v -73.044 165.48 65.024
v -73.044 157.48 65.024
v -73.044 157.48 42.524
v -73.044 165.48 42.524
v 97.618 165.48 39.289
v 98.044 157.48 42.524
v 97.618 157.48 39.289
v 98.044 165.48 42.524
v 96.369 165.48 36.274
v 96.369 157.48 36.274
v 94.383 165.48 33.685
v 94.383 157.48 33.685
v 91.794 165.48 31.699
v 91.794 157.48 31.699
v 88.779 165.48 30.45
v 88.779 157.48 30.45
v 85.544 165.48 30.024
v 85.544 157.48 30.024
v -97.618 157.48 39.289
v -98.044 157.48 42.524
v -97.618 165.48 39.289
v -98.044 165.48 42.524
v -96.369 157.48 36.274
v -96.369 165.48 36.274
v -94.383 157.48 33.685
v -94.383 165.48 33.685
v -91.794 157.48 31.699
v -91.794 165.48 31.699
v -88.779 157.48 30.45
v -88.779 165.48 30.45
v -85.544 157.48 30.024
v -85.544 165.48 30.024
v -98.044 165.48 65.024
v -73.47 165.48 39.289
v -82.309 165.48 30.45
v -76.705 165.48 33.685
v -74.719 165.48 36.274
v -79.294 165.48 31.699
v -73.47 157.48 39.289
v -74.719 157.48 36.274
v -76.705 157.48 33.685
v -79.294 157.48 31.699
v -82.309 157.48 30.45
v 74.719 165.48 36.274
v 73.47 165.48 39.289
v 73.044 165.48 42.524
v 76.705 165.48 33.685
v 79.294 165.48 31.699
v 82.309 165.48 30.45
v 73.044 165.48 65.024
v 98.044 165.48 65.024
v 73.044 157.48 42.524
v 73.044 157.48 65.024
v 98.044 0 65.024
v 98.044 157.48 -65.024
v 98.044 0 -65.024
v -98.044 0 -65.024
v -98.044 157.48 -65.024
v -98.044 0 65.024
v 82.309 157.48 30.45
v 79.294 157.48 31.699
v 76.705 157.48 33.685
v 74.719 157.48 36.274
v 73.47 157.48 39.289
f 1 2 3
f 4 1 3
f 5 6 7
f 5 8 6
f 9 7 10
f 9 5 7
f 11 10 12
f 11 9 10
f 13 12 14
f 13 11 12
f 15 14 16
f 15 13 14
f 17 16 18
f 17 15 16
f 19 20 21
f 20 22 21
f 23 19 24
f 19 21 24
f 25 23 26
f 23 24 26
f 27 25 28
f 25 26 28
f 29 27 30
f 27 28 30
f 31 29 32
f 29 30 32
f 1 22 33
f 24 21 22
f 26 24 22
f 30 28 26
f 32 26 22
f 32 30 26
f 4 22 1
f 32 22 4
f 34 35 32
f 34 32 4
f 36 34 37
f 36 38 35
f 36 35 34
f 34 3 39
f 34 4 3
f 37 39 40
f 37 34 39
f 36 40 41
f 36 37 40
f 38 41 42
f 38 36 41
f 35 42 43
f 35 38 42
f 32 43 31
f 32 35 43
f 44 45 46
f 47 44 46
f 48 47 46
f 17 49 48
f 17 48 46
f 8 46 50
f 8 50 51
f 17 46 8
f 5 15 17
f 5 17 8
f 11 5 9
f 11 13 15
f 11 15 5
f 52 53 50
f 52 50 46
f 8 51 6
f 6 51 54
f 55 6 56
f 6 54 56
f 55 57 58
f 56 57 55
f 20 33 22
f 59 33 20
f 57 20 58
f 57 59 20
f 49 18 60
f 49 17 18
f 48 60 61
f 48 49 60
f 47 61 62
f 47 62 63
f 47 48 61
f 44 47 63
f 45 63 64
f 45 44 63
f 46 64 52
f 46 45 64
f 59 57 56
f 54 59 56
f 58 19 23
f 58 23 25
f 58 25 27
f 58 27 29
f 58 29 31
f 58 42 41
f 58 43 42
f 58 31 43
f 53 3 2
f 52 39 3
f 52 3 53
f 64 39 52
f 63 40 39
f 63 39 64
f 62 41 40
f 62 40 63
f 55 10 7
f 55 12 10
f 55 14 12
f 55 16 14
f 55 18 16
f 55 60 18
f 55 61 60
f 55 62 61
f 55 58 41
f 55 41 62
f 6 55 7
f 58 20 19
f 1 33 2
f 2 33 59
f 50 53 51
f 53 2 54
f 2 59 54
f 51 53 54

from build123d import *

# Parameters (mm, degrees)
SKETCH_1_W      = 196.088
SKETCH_1_H      = 130.048
EXTRUDE_1_DEPTH = 157.48
SKETCH_3_W      = 25
SKETCH_3_H      = 35
EXTRUDE_2_DEPTH = 8
FILLET_2_R      = 12.5


with BuildPart() as part:
    # 草图1 → 凸台-拉伸1 (new body)
    with BuildSketch(Plane(origin=(0, 0, 0), x_dir=(1, 0, 0), z_dir=(0, 1, 0))):
        Rectangle(SKETCH_1_W, SKETCH_1_H)
    extrude(amount=EXTRUDE_1_DEPTH)

    # 草图3 → 凸台-拉伸2 (add)
    with BuildSketch(Plane(origin=(0, 157.48, 0), x_dir=(1, 0, 0), z_dir=(0, 1, 0))):
        with Locations((-85.544, -47.524)):
            Rectangle(SKETCH_3_W, SKETCH_3_H)
        with Locations((85.544, -47.524)):
            Rectangle(SKETCH_3_W, SKETCH_3_H)
    extrude(amount=EXTRUDE_2_DEPTH)

    # 圆角2
    fillet_2_edges = [part.edges().sort_by_distance(p)[0] for p in [
        (73.044, 161.48, 30.024),
        (98.044, 161.48, 30.024),
        (-98.044, 161.48, 30.024),
        (-73.044, 161.48, 30.024),
    ]]
    fillet(fillet_2_edges, radius=FILLET_2_R - 0.0001)  # a hair under: the kernel refuses the full size


solid = part.part
